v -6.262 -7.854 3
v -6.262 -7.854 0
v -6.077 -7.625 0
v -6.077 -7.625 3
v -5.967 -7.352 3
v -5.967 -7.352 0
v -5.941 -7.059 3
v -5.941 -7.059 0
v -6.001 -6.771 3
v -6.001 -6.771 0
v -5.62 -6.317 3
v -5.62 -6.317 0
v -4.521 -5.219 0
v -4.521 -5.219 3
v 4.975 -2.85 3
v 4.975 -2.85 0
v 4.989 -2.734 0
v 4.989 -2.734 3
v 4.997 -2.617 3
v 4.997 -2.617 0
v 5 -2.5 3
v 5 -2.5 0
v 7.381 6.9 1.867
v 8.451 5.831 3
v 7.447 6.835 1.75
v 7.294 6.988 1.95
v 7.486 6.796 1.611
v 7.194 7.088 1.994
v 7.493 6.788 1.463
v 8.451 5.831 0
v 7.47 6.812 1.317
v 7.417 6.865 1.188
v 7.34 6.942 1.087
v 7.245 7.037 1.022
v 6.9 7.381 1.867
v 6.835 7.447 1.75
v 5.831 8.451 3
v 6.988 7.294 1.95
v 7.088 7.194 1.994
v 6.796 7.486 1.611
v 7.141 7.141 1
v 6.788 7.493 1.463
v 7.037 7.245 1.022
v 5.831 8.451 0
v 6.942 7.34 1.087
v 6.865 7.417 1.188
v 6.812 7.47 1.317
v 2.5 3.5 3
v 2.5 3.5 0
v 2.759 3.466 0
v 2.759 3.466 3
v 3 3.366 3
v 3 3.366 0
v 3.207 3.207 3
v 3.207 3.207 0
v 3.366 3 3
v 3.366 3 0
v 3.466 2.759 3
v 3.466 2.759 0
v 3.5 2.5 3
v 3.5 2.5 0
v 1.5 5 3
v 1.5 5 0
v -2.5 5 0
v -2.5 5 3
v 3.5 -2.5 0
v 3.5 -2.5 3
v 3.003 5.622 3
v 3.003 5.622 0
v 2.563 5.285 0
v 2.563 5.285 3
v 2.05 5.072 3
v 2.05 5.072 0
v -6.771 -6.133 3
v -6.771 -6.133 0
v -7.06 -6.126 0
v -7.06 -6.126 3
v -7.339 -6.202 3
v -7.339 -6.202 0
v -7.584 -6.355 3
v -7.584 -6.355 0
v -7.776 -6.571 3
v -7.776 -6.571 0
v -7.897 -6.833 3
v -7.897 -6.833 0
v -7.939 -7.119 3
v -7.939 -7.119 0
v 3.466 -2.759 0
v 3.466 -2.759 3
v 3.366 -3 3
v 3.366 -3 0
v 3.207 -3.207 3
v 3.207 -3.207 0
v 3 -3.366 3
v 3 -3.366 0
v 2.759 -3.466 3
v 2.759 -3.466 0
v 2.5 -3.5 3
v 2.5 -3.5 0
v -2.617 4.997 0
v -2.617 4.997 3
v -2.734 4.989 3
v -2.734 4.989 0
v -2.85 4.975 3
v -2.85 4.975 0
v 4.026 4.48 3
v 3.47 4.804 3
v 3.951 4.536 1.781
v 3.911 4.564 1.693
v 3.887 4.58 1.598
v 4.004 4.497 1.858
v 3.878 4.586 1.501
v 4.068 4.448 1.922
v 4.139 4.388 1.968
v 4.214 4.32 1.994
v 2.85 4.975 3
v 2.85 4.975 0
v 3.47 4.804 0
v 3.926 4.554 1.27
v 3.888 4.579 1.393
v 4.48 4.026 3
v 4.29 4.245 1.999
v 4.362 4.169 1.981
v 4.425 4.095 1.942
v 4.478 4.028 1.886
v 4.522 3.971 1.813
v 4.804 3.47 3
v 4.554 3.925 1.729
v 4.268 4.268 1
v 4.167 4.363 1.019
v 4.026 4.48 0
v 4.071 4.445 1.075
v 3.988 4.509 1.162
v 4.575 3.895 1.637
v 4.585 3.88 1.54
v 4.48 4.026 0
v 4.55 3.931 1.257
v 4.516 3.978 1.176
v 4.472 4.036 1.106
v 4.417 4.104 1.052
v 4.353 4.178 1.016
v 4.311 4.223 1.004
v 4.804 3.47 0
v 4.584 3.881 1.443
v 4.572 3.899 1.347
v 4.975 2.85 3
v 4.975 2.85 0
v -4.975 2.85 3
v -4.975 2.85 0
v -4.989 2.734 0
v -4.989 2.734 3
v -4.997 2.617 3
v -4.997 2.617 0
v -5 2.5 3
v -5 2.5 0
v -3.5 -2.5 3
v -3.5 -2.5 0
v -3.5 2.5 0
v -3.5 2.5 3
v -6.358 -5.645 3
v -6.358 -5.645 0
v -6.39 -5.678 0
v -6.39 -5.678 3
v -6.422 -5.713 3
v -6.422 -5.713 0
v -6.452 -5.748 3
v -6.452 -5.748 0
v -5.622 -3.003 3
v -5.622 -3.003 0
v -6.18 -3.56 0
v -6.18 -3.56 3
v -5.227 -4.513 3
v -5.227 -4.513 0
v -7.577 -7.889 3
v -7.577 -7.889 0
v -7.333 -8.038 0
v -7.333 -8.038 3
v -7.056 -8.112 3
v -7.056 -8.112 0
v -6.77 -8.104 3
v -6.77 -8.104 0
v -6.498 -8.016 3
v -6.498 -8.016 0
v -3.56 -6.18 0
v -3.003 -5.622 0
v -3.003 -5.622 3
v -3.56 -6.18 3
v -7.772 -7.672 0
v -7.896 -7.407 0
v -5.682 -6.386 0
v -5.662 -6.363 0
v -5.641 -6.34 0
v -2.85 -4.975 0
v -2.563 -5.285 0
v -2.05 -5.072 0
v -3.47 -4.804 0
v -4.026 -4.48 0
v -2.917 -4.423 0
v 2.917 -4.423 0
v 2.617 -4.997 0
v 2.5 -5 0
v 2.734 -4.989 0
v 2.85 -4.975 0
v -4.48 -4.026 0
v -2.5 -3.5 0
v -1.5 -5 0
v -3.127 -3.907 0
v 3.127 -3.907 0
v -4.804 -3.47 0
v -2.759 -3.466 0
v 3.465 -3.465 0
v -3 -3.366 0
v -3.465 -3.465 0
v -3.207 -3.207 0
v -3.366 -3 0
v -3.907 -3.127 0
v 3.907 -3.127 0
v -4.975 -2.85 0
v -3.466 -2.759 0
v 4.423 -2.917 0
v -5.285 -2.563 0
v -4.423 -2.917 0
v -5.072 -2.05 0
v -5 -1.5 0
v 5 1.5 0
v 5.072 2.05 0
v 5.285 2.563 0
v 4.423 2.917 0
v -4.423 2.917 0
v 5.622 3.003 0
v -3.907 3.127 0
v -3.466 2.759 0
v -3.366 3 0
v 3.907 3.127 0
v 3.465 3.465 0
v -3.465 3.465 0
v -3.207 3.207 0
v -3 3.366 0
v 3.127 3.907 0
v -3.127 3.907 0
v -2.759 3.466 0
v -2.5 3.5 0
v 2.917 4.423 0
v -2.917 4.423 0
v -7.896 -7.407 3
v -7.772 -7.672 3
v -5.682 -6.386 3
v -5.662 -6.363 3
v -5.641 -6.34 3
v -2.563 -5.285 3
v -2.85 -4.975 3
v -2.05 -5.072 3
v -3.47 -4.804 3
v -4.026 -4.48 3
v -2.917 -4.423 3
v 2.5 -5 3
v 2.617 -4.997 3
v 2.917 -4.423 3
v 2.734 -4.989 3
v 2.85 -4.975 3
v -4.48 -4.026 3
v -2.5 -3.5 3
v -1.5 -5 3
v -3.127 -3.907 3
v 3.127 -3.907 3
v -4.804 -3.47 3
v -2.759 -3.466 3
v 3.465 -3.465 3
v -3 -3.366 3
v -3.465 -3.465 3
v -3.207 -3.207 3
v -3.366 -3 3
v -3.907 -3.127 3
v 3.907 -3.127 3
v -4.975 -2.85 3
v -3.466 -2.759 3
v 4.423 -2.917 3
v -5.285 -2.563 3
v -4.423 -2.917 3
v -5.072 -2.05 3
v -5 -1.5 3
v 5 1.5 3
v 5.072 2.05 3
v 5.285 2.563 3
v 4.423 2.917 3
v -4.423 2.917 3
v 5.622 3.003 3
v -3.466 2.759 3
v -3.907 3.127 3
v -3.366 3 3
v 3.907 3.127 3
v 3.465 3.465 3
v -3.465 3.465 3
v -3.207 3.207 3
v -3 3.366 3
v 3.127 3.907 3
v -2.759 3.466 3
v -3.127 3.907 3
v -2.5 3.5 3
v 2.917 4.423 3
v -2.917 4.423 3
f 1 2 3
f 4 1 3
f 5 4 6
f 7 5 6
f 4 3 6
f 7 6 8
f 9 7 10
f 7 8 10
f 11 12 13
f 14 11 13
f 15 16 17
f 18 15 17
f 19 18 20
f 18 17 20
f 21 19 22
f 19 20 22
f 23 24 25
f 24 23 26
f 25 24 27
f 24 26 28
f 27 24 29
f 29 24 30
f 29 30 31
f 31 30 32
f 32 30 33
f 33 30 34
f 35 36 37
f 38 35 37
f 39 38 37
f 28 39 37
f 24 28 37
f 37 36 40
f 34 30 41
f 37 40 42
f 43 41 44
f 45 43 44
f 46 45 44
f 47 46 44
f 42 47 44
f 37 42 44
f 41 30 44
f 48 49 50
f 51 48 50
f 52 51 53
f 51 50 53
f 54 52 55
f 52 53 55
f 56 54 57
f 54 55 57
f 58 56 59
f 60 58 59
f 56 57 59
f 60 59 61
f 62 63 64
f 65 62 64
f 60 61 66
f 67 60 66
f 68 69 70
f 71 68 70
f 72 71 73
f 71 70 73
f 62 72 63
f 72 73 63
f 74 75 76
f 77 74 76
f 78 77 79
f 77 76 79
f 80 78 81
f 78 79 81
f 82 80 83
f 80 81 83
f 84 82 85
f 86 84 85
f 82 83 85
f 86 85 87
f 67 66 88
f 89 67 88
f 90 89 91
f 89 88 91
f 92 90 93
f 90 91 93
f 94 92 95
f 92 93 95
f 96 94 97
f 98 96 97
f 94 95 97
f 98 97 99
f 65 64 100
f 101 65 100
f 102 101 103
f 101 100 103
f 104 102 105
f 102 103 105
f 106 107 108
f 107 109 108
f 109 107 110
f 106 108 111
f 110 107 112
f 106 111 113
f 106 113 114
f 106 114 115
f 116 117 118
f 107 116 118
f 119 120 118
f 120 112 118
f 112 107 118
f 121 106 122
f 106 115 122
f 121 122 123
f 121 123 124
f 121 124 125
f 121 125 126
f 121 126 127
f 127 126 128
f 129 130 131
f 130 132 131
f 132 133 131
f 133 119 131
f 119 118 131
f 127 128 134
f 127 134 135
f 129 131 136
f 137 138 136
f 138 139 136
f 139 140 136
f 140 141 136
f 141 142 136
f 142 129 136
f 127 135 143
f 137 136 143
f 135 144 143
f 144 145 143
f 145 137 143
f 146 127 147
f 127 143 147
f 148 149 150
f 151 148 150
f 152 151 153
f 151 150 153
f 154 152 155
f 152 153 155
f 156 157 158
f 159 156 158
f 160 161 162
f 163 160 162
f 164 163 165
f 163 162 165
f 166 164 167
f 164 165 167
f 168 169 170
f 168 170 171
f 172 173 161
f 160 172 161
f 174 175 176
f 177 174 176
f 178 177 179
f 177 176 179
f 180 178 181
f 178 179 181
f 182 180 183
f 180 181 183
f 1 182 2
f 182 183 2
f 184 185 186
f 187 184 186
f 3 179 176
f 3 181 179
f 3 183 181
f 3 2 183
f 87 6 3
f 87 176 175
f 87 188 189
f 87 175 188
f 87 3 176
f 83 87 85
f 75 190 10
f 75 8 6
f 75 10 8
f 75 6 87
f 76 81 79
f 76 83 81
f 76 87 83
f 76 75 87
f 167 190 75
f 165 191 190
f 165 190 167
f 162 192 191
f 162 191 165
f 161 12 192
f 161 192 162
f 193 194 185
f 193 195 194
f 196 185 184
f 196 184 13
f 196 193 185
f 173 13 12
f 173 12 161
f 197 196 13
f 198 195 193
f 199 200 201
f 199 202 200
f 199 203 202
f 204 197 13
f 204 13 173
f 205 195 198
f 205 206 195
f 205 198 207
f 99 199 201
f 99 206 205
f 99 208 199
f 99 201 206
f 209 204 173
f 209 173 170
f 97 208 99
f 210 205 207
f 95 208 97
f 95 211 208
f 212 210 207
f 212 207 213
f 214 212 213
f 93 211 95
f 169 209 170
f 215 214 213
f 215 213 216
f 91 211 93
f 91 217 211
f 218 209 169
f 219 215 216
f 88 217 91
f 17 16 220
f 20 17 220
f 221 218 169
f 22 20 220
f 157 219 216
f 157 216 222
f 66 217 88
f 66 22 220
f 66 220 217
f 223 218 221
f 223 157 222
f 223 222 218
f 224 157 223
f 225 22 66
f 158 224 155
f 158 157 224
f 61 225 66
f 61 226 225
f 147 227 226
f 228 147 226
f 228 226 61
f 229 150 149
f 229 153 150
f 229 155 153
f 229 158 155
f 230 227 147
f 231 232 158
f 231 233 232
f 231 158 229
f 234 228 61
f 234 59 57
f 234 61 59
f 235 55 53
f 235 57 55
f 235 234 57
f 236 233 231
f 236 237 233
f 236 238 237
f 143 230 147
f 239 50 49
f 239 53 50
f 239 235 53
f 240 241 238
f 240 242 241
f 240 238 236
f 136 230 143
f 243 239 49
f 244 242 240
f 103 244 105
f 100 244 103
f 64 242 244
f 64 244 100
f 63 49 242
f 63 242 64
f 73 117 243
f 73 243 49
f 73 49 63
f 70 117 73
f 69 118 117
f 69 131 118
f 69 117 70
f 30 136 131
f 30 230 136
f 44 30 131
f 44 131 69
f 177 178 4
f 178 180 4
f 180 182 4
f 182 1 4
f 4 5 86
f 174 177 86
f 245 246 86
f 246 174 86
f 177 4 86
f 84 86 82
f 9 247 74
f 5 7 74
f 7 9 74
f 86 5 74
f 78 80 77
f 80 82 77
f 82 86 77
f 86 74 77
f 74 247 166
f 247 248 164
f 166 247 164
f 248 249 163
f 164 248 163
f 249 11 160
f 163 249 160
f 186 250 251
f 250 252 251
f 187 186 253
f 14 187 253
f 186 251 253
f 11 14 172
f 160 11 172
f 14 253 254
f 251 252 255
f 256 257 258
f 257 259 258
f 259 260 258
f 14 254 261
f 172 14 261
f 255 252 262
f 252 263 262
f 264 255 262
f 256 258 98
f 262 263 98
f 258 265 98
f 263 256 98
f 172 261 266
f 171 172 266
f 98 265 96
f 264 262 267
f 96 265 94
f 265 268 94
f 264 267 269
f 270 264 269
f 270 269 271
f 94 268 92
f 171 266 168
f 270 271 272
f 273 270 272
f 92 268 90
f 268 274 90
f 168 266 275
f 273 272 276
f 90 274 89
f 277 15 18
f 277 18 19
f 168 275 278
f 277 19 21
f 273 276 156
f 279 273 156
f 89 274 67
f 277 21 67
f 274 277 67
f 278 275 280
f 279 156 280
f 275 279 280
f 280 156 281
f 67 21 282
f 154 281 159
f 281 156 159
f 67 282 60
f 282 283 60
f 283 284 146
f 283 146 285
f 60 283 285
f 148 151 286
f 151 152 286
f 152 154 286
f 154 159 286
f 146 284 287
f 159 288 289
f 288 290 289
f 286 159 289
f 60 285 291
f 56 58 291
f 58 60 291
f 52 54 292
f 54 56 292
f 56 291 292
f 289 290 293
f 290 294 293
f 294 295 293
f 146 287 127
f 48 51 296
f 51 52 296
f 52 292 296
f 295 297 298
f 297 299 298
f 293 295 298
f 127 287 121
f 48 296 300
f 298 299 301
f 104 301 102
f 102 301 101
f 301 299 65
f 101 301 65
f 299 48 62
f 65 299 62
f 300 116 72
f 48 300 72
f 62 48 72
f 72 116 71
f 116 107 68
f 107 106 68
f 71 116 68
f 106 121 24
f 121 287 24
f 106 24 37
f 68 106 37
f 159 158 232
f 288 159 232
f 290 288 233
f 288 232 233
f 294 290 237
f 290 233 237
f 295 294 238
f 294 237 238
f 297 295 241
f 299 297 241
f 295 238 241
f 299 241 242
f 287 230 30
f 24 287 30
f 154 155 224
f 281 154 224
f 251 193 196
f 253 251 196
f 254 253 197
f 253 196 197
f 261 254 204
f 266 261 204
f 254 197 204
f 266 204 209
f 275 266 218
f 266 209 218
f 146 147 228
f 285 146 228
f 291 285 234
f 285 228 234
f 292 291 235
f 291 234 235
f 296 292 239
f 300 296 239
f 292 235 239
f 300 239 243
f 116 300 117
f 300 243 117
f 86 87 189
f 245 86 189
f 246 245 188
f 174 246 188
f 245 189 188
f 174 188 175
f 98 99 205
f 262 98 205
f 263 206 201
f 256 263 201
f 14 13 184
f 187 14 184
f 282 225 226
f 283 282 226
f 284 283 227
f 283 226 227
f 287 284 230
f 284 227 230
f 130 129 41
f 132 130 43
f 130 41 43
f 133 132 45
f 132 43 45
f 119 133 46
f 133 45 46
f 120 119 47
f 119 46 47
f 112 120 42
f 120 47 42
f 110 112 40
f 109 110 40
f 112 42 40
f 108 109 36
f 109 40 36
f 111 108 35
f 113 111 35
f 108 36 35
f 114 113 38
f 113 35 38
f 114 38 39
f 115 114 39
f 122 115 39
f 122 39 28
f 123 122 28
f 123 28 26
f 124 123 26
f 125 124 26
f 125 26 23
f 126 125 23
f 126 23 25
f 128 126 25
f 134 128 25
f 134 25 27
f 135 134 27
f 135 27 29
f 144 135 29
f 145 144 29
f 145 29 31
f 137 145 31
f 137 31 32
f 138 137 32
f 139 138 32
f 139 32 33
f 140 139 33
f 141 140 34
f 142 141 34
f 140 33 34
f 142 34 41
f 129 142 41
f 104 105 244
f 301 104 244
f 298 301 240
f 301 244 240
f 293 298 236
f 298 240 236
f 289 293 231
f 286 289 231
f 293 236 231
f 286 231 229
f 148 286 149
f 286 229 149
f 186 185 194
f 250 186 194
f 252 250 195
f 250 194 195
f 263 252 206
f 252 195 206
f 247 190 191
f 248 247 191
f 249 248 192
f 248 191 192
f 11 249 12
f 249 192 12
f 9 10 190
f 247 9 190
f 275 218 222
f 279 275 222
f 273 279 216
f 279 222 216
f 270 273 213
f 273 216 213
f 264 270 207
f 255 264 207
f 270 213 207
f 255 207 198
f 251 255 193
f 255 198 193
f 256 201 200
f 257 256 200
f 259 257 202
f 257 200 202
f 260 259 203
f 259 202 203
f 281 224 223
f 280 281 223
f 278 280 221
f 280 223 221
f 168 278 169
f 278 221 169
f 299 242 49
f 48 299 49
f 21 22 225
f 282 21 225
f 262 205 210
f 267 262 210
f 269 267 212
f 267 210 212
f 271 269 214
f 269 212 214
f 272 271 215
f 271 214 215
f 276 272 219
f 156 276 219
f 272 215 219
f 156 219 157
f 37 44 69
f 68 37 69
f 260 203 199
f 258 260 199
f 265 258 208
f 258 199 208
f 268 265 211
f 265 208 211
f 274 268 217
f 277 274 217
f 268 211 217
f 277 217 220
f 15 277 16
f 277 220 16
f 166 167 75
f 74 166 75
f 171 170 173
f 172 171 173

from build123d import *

# Parameters (mm, degrees)
EXTRUDE_1_DEPTH     = 3
SKETCH_4_W          = 3
SKETCH_4_H          = 3.704951288
EXTRUDE_3_DEPTH     = 1
CUT_EXTRUDE_2_REACH = 25.244
SKETCH_6_R          = 0.5
CUT_EXTRUDE_3_DEPTH = 3


with BuildPart() as part:
    # 草图1 → 凸台-拉伸1 (new body)
    with BuildSketch(Plane.XY):
        with BuildLine():
            ThreePointArc((-4.975392322, 2.84990406), (-4.993840493, 2.675384142), (-5, 2.5))
            Line((-5, 2.5), (-5, -1.5))
            ThreePointArc((-5, -1.5), (-5.161755993, -2.313202294), (-5.62239809, -3.00260191))
            Line((-5.62239809, -3.00260191), (-8.450825215, -5.831029035))
            Line((-8.450825215, -5.831029035), (-5.831029035, -8.450825215))
            Line((-5.831029035, -8.450825215), (-3.00260191, -5.62239809))
            ThreePointArc((-3.00260191, -5.62239809), (-2.313202294, -5.161755993), (-1.5, -5))
            Line((-1.5, -5), (2.5, -5))
            ThreePointArc((2.5, -5), (2.675384142, -4.993840493), (2.84990406, -4.975392322))
            ThreePointArc((2.84990406, -4.975392322), (3.464823228, -3.464823228), (4.975392322, -2.84990406))
            ThreePointArc((4.975392322, -2.84990406), (4.993840493, -2.675384142), (5, -2.5))
            Line((5, -2.5), (5, 1.5))
            ThreePointArc((5, 1.5), (5.161755993, 2.313202294), (5.62239809, 3.00260191))
            Line((5.62239809, 3.00260191), (8.450825215, 5.831029035))
            Line((8.450825215, 5.831029035), (5.831029035, 8.450825215))
            Line((5.831029035, 8.450825215), (3.00260191, 5.62239809))
            ThreePointArc((3.00260191, 5.62239809), (2.313202294, 5.161755993), (1.5, 5))
            Line((1.5, 5), (-2.5, 5))
            ThreePointArc((-2.5, 5), (-2.675384142, 4.993840493), (-2.84990406, 4.975392322))
            ThreePointArc((-2.84990406, 4.975392322), (-3.464823228, 3.464823228), (-4.975392322, 2.84990406))
        make_face()
        with BuildLine():
            ThreePointArc((4.975392322, 2.84990406), (3.464823228, 3.464823228), (2.84990406, 4.975392322))
            ThreePointArc((2.84990406, 4.975392322), (4.267766953, 4.267766953), (4.975392322, 2.84990406))
        make_face(mode=Mode.SUBTRACT)
        with BuildLine():
            ThreePointArc((-4.975392322, -2.84990406), (-3.464823228, -3.464823228), (-2.84990406, -4.975392322))
            ThreePointArc((-2.84990406, -4.975392322), (-4.267766953, -4.267766953), (-4.975392322, -2.84990406))
        make_face(mode=Mode.SUBTRACT)
        with BuildLine():
            ThreePointArc((-3.5, 2.5), (-3.207106781, 3.207106781), (-2.5, 3.5))
            Line((-2.5, 3.5), (2.5, 3.5))
            ThreePointArc((2.5, 3.5), (3.207106781, 3.207106781), (3.5, 2.5))
            Line((3.5, 2.5), (3.5, -2.5))
            ThreePointArc((3.5, -2.5), (3.207106781, -3.207106781), (2.5, -3.5))
            Line((2.5, -3.5), (-2.5, -3.5))
            ThreePointArc((-2.5, -3.5), (-3.207106781, -3.207106781), (-3.5, -2.5))
            Line((-3.5, -2.5), (-3.5, 2.5))
        make_face(mode=Mode.SUBTRACT)
    extrude(amount=EXTRUDE_1_DEPTH)

    # 草图4 → 凸台-拉伸3 (add)
    with BuildSketch(Plane(origin=(-7.140927125, -7.140927125, 0), x_dir=(0, 0, 1), z_dir=(-0.7071067811865472, -0.7071067811865479, 0))):
        with Locations((1.5, 0)):
            Rectangle(SKETCH_4_W, SKETCH_4_H)
    extrude(amount=EXTRUDE_3_DEPTH)

    # 草图6 → 切除-拉伸2 (cut, up to next)
    with BuildSketch(Plane(origin=(7.140927125, 7.140927125, 0), x_dir=(0, 0, -1), z_dir=(0.7071067811865476, 0.7071067811865476, 0)), mode=Mode.PRIVATE) as cut_extrude_2_sk1:
        with Locations((-1.5, 0)):
            Circle(SKETCH_6_R)
    cut_extrude_2_tool1 = extrude(cut_extrude_2_sk1.sketch, amount=-CUT_EXTRUDE_2_REACH, mode=Mode.PRIVATE) & part.part
    add(cut_extrude_2_tool1.solids().sort_by_distance((7.140927, 7.140927, 1.5))[0], mode=Mode.SUBTRACT)

    # 草图7 → 切除-拉伸3 (cut)
    with BuildSketch(Plane(origin=(0, 0, 0), x_dir=(-1, 0, 0), z_dir=(0, 0, -1))):
        with BuildLine():
            Line((6.001378676, -6.771192907), (5.682244672, -6.386285792))
            ThreePointArc((5.682244672, -6.386285792), (5.65169265, -6.351136109), (5.619537223, -6.317447019))
            Line((5.619537223, -6.317447019), (4.521052929, -5.218962725))
            Line((4.521052929, -5.218962725), (3.560109737, -6.179905917))
            Line((3.560109737, -6.179905917), (6.538135816, -9.157931996))
            Line((6.538135816, -9.157931996), (9.157931996, -6.538135816))
            Line((9.157931996, -6.538135816), (6.179905917, -3.560109737))
            Line((6.179905917, -3.560109737), (5.226626879, -4.513388774))
            Line((5.226626879, -4.513388774), (6.357997729, -5.644759624))
            ThreePointArc((6.357997729, -5.644759624), (6.40623087, -5.695293259), (6.452058903, -5.748017783))
            Line((6.452058903, -5.748017783), (6.771192907, -6.132924899))
            ThreePointArc((6.771192907, -6.132924899), (7.57731011, -7.888551813), (6.001378676, -6.771192907))
        make_face()
    extrude(amount=-CUT_EXTRUDE_3_DEPTH, mode=Mode.SUBTRACT)


solid = part.part
